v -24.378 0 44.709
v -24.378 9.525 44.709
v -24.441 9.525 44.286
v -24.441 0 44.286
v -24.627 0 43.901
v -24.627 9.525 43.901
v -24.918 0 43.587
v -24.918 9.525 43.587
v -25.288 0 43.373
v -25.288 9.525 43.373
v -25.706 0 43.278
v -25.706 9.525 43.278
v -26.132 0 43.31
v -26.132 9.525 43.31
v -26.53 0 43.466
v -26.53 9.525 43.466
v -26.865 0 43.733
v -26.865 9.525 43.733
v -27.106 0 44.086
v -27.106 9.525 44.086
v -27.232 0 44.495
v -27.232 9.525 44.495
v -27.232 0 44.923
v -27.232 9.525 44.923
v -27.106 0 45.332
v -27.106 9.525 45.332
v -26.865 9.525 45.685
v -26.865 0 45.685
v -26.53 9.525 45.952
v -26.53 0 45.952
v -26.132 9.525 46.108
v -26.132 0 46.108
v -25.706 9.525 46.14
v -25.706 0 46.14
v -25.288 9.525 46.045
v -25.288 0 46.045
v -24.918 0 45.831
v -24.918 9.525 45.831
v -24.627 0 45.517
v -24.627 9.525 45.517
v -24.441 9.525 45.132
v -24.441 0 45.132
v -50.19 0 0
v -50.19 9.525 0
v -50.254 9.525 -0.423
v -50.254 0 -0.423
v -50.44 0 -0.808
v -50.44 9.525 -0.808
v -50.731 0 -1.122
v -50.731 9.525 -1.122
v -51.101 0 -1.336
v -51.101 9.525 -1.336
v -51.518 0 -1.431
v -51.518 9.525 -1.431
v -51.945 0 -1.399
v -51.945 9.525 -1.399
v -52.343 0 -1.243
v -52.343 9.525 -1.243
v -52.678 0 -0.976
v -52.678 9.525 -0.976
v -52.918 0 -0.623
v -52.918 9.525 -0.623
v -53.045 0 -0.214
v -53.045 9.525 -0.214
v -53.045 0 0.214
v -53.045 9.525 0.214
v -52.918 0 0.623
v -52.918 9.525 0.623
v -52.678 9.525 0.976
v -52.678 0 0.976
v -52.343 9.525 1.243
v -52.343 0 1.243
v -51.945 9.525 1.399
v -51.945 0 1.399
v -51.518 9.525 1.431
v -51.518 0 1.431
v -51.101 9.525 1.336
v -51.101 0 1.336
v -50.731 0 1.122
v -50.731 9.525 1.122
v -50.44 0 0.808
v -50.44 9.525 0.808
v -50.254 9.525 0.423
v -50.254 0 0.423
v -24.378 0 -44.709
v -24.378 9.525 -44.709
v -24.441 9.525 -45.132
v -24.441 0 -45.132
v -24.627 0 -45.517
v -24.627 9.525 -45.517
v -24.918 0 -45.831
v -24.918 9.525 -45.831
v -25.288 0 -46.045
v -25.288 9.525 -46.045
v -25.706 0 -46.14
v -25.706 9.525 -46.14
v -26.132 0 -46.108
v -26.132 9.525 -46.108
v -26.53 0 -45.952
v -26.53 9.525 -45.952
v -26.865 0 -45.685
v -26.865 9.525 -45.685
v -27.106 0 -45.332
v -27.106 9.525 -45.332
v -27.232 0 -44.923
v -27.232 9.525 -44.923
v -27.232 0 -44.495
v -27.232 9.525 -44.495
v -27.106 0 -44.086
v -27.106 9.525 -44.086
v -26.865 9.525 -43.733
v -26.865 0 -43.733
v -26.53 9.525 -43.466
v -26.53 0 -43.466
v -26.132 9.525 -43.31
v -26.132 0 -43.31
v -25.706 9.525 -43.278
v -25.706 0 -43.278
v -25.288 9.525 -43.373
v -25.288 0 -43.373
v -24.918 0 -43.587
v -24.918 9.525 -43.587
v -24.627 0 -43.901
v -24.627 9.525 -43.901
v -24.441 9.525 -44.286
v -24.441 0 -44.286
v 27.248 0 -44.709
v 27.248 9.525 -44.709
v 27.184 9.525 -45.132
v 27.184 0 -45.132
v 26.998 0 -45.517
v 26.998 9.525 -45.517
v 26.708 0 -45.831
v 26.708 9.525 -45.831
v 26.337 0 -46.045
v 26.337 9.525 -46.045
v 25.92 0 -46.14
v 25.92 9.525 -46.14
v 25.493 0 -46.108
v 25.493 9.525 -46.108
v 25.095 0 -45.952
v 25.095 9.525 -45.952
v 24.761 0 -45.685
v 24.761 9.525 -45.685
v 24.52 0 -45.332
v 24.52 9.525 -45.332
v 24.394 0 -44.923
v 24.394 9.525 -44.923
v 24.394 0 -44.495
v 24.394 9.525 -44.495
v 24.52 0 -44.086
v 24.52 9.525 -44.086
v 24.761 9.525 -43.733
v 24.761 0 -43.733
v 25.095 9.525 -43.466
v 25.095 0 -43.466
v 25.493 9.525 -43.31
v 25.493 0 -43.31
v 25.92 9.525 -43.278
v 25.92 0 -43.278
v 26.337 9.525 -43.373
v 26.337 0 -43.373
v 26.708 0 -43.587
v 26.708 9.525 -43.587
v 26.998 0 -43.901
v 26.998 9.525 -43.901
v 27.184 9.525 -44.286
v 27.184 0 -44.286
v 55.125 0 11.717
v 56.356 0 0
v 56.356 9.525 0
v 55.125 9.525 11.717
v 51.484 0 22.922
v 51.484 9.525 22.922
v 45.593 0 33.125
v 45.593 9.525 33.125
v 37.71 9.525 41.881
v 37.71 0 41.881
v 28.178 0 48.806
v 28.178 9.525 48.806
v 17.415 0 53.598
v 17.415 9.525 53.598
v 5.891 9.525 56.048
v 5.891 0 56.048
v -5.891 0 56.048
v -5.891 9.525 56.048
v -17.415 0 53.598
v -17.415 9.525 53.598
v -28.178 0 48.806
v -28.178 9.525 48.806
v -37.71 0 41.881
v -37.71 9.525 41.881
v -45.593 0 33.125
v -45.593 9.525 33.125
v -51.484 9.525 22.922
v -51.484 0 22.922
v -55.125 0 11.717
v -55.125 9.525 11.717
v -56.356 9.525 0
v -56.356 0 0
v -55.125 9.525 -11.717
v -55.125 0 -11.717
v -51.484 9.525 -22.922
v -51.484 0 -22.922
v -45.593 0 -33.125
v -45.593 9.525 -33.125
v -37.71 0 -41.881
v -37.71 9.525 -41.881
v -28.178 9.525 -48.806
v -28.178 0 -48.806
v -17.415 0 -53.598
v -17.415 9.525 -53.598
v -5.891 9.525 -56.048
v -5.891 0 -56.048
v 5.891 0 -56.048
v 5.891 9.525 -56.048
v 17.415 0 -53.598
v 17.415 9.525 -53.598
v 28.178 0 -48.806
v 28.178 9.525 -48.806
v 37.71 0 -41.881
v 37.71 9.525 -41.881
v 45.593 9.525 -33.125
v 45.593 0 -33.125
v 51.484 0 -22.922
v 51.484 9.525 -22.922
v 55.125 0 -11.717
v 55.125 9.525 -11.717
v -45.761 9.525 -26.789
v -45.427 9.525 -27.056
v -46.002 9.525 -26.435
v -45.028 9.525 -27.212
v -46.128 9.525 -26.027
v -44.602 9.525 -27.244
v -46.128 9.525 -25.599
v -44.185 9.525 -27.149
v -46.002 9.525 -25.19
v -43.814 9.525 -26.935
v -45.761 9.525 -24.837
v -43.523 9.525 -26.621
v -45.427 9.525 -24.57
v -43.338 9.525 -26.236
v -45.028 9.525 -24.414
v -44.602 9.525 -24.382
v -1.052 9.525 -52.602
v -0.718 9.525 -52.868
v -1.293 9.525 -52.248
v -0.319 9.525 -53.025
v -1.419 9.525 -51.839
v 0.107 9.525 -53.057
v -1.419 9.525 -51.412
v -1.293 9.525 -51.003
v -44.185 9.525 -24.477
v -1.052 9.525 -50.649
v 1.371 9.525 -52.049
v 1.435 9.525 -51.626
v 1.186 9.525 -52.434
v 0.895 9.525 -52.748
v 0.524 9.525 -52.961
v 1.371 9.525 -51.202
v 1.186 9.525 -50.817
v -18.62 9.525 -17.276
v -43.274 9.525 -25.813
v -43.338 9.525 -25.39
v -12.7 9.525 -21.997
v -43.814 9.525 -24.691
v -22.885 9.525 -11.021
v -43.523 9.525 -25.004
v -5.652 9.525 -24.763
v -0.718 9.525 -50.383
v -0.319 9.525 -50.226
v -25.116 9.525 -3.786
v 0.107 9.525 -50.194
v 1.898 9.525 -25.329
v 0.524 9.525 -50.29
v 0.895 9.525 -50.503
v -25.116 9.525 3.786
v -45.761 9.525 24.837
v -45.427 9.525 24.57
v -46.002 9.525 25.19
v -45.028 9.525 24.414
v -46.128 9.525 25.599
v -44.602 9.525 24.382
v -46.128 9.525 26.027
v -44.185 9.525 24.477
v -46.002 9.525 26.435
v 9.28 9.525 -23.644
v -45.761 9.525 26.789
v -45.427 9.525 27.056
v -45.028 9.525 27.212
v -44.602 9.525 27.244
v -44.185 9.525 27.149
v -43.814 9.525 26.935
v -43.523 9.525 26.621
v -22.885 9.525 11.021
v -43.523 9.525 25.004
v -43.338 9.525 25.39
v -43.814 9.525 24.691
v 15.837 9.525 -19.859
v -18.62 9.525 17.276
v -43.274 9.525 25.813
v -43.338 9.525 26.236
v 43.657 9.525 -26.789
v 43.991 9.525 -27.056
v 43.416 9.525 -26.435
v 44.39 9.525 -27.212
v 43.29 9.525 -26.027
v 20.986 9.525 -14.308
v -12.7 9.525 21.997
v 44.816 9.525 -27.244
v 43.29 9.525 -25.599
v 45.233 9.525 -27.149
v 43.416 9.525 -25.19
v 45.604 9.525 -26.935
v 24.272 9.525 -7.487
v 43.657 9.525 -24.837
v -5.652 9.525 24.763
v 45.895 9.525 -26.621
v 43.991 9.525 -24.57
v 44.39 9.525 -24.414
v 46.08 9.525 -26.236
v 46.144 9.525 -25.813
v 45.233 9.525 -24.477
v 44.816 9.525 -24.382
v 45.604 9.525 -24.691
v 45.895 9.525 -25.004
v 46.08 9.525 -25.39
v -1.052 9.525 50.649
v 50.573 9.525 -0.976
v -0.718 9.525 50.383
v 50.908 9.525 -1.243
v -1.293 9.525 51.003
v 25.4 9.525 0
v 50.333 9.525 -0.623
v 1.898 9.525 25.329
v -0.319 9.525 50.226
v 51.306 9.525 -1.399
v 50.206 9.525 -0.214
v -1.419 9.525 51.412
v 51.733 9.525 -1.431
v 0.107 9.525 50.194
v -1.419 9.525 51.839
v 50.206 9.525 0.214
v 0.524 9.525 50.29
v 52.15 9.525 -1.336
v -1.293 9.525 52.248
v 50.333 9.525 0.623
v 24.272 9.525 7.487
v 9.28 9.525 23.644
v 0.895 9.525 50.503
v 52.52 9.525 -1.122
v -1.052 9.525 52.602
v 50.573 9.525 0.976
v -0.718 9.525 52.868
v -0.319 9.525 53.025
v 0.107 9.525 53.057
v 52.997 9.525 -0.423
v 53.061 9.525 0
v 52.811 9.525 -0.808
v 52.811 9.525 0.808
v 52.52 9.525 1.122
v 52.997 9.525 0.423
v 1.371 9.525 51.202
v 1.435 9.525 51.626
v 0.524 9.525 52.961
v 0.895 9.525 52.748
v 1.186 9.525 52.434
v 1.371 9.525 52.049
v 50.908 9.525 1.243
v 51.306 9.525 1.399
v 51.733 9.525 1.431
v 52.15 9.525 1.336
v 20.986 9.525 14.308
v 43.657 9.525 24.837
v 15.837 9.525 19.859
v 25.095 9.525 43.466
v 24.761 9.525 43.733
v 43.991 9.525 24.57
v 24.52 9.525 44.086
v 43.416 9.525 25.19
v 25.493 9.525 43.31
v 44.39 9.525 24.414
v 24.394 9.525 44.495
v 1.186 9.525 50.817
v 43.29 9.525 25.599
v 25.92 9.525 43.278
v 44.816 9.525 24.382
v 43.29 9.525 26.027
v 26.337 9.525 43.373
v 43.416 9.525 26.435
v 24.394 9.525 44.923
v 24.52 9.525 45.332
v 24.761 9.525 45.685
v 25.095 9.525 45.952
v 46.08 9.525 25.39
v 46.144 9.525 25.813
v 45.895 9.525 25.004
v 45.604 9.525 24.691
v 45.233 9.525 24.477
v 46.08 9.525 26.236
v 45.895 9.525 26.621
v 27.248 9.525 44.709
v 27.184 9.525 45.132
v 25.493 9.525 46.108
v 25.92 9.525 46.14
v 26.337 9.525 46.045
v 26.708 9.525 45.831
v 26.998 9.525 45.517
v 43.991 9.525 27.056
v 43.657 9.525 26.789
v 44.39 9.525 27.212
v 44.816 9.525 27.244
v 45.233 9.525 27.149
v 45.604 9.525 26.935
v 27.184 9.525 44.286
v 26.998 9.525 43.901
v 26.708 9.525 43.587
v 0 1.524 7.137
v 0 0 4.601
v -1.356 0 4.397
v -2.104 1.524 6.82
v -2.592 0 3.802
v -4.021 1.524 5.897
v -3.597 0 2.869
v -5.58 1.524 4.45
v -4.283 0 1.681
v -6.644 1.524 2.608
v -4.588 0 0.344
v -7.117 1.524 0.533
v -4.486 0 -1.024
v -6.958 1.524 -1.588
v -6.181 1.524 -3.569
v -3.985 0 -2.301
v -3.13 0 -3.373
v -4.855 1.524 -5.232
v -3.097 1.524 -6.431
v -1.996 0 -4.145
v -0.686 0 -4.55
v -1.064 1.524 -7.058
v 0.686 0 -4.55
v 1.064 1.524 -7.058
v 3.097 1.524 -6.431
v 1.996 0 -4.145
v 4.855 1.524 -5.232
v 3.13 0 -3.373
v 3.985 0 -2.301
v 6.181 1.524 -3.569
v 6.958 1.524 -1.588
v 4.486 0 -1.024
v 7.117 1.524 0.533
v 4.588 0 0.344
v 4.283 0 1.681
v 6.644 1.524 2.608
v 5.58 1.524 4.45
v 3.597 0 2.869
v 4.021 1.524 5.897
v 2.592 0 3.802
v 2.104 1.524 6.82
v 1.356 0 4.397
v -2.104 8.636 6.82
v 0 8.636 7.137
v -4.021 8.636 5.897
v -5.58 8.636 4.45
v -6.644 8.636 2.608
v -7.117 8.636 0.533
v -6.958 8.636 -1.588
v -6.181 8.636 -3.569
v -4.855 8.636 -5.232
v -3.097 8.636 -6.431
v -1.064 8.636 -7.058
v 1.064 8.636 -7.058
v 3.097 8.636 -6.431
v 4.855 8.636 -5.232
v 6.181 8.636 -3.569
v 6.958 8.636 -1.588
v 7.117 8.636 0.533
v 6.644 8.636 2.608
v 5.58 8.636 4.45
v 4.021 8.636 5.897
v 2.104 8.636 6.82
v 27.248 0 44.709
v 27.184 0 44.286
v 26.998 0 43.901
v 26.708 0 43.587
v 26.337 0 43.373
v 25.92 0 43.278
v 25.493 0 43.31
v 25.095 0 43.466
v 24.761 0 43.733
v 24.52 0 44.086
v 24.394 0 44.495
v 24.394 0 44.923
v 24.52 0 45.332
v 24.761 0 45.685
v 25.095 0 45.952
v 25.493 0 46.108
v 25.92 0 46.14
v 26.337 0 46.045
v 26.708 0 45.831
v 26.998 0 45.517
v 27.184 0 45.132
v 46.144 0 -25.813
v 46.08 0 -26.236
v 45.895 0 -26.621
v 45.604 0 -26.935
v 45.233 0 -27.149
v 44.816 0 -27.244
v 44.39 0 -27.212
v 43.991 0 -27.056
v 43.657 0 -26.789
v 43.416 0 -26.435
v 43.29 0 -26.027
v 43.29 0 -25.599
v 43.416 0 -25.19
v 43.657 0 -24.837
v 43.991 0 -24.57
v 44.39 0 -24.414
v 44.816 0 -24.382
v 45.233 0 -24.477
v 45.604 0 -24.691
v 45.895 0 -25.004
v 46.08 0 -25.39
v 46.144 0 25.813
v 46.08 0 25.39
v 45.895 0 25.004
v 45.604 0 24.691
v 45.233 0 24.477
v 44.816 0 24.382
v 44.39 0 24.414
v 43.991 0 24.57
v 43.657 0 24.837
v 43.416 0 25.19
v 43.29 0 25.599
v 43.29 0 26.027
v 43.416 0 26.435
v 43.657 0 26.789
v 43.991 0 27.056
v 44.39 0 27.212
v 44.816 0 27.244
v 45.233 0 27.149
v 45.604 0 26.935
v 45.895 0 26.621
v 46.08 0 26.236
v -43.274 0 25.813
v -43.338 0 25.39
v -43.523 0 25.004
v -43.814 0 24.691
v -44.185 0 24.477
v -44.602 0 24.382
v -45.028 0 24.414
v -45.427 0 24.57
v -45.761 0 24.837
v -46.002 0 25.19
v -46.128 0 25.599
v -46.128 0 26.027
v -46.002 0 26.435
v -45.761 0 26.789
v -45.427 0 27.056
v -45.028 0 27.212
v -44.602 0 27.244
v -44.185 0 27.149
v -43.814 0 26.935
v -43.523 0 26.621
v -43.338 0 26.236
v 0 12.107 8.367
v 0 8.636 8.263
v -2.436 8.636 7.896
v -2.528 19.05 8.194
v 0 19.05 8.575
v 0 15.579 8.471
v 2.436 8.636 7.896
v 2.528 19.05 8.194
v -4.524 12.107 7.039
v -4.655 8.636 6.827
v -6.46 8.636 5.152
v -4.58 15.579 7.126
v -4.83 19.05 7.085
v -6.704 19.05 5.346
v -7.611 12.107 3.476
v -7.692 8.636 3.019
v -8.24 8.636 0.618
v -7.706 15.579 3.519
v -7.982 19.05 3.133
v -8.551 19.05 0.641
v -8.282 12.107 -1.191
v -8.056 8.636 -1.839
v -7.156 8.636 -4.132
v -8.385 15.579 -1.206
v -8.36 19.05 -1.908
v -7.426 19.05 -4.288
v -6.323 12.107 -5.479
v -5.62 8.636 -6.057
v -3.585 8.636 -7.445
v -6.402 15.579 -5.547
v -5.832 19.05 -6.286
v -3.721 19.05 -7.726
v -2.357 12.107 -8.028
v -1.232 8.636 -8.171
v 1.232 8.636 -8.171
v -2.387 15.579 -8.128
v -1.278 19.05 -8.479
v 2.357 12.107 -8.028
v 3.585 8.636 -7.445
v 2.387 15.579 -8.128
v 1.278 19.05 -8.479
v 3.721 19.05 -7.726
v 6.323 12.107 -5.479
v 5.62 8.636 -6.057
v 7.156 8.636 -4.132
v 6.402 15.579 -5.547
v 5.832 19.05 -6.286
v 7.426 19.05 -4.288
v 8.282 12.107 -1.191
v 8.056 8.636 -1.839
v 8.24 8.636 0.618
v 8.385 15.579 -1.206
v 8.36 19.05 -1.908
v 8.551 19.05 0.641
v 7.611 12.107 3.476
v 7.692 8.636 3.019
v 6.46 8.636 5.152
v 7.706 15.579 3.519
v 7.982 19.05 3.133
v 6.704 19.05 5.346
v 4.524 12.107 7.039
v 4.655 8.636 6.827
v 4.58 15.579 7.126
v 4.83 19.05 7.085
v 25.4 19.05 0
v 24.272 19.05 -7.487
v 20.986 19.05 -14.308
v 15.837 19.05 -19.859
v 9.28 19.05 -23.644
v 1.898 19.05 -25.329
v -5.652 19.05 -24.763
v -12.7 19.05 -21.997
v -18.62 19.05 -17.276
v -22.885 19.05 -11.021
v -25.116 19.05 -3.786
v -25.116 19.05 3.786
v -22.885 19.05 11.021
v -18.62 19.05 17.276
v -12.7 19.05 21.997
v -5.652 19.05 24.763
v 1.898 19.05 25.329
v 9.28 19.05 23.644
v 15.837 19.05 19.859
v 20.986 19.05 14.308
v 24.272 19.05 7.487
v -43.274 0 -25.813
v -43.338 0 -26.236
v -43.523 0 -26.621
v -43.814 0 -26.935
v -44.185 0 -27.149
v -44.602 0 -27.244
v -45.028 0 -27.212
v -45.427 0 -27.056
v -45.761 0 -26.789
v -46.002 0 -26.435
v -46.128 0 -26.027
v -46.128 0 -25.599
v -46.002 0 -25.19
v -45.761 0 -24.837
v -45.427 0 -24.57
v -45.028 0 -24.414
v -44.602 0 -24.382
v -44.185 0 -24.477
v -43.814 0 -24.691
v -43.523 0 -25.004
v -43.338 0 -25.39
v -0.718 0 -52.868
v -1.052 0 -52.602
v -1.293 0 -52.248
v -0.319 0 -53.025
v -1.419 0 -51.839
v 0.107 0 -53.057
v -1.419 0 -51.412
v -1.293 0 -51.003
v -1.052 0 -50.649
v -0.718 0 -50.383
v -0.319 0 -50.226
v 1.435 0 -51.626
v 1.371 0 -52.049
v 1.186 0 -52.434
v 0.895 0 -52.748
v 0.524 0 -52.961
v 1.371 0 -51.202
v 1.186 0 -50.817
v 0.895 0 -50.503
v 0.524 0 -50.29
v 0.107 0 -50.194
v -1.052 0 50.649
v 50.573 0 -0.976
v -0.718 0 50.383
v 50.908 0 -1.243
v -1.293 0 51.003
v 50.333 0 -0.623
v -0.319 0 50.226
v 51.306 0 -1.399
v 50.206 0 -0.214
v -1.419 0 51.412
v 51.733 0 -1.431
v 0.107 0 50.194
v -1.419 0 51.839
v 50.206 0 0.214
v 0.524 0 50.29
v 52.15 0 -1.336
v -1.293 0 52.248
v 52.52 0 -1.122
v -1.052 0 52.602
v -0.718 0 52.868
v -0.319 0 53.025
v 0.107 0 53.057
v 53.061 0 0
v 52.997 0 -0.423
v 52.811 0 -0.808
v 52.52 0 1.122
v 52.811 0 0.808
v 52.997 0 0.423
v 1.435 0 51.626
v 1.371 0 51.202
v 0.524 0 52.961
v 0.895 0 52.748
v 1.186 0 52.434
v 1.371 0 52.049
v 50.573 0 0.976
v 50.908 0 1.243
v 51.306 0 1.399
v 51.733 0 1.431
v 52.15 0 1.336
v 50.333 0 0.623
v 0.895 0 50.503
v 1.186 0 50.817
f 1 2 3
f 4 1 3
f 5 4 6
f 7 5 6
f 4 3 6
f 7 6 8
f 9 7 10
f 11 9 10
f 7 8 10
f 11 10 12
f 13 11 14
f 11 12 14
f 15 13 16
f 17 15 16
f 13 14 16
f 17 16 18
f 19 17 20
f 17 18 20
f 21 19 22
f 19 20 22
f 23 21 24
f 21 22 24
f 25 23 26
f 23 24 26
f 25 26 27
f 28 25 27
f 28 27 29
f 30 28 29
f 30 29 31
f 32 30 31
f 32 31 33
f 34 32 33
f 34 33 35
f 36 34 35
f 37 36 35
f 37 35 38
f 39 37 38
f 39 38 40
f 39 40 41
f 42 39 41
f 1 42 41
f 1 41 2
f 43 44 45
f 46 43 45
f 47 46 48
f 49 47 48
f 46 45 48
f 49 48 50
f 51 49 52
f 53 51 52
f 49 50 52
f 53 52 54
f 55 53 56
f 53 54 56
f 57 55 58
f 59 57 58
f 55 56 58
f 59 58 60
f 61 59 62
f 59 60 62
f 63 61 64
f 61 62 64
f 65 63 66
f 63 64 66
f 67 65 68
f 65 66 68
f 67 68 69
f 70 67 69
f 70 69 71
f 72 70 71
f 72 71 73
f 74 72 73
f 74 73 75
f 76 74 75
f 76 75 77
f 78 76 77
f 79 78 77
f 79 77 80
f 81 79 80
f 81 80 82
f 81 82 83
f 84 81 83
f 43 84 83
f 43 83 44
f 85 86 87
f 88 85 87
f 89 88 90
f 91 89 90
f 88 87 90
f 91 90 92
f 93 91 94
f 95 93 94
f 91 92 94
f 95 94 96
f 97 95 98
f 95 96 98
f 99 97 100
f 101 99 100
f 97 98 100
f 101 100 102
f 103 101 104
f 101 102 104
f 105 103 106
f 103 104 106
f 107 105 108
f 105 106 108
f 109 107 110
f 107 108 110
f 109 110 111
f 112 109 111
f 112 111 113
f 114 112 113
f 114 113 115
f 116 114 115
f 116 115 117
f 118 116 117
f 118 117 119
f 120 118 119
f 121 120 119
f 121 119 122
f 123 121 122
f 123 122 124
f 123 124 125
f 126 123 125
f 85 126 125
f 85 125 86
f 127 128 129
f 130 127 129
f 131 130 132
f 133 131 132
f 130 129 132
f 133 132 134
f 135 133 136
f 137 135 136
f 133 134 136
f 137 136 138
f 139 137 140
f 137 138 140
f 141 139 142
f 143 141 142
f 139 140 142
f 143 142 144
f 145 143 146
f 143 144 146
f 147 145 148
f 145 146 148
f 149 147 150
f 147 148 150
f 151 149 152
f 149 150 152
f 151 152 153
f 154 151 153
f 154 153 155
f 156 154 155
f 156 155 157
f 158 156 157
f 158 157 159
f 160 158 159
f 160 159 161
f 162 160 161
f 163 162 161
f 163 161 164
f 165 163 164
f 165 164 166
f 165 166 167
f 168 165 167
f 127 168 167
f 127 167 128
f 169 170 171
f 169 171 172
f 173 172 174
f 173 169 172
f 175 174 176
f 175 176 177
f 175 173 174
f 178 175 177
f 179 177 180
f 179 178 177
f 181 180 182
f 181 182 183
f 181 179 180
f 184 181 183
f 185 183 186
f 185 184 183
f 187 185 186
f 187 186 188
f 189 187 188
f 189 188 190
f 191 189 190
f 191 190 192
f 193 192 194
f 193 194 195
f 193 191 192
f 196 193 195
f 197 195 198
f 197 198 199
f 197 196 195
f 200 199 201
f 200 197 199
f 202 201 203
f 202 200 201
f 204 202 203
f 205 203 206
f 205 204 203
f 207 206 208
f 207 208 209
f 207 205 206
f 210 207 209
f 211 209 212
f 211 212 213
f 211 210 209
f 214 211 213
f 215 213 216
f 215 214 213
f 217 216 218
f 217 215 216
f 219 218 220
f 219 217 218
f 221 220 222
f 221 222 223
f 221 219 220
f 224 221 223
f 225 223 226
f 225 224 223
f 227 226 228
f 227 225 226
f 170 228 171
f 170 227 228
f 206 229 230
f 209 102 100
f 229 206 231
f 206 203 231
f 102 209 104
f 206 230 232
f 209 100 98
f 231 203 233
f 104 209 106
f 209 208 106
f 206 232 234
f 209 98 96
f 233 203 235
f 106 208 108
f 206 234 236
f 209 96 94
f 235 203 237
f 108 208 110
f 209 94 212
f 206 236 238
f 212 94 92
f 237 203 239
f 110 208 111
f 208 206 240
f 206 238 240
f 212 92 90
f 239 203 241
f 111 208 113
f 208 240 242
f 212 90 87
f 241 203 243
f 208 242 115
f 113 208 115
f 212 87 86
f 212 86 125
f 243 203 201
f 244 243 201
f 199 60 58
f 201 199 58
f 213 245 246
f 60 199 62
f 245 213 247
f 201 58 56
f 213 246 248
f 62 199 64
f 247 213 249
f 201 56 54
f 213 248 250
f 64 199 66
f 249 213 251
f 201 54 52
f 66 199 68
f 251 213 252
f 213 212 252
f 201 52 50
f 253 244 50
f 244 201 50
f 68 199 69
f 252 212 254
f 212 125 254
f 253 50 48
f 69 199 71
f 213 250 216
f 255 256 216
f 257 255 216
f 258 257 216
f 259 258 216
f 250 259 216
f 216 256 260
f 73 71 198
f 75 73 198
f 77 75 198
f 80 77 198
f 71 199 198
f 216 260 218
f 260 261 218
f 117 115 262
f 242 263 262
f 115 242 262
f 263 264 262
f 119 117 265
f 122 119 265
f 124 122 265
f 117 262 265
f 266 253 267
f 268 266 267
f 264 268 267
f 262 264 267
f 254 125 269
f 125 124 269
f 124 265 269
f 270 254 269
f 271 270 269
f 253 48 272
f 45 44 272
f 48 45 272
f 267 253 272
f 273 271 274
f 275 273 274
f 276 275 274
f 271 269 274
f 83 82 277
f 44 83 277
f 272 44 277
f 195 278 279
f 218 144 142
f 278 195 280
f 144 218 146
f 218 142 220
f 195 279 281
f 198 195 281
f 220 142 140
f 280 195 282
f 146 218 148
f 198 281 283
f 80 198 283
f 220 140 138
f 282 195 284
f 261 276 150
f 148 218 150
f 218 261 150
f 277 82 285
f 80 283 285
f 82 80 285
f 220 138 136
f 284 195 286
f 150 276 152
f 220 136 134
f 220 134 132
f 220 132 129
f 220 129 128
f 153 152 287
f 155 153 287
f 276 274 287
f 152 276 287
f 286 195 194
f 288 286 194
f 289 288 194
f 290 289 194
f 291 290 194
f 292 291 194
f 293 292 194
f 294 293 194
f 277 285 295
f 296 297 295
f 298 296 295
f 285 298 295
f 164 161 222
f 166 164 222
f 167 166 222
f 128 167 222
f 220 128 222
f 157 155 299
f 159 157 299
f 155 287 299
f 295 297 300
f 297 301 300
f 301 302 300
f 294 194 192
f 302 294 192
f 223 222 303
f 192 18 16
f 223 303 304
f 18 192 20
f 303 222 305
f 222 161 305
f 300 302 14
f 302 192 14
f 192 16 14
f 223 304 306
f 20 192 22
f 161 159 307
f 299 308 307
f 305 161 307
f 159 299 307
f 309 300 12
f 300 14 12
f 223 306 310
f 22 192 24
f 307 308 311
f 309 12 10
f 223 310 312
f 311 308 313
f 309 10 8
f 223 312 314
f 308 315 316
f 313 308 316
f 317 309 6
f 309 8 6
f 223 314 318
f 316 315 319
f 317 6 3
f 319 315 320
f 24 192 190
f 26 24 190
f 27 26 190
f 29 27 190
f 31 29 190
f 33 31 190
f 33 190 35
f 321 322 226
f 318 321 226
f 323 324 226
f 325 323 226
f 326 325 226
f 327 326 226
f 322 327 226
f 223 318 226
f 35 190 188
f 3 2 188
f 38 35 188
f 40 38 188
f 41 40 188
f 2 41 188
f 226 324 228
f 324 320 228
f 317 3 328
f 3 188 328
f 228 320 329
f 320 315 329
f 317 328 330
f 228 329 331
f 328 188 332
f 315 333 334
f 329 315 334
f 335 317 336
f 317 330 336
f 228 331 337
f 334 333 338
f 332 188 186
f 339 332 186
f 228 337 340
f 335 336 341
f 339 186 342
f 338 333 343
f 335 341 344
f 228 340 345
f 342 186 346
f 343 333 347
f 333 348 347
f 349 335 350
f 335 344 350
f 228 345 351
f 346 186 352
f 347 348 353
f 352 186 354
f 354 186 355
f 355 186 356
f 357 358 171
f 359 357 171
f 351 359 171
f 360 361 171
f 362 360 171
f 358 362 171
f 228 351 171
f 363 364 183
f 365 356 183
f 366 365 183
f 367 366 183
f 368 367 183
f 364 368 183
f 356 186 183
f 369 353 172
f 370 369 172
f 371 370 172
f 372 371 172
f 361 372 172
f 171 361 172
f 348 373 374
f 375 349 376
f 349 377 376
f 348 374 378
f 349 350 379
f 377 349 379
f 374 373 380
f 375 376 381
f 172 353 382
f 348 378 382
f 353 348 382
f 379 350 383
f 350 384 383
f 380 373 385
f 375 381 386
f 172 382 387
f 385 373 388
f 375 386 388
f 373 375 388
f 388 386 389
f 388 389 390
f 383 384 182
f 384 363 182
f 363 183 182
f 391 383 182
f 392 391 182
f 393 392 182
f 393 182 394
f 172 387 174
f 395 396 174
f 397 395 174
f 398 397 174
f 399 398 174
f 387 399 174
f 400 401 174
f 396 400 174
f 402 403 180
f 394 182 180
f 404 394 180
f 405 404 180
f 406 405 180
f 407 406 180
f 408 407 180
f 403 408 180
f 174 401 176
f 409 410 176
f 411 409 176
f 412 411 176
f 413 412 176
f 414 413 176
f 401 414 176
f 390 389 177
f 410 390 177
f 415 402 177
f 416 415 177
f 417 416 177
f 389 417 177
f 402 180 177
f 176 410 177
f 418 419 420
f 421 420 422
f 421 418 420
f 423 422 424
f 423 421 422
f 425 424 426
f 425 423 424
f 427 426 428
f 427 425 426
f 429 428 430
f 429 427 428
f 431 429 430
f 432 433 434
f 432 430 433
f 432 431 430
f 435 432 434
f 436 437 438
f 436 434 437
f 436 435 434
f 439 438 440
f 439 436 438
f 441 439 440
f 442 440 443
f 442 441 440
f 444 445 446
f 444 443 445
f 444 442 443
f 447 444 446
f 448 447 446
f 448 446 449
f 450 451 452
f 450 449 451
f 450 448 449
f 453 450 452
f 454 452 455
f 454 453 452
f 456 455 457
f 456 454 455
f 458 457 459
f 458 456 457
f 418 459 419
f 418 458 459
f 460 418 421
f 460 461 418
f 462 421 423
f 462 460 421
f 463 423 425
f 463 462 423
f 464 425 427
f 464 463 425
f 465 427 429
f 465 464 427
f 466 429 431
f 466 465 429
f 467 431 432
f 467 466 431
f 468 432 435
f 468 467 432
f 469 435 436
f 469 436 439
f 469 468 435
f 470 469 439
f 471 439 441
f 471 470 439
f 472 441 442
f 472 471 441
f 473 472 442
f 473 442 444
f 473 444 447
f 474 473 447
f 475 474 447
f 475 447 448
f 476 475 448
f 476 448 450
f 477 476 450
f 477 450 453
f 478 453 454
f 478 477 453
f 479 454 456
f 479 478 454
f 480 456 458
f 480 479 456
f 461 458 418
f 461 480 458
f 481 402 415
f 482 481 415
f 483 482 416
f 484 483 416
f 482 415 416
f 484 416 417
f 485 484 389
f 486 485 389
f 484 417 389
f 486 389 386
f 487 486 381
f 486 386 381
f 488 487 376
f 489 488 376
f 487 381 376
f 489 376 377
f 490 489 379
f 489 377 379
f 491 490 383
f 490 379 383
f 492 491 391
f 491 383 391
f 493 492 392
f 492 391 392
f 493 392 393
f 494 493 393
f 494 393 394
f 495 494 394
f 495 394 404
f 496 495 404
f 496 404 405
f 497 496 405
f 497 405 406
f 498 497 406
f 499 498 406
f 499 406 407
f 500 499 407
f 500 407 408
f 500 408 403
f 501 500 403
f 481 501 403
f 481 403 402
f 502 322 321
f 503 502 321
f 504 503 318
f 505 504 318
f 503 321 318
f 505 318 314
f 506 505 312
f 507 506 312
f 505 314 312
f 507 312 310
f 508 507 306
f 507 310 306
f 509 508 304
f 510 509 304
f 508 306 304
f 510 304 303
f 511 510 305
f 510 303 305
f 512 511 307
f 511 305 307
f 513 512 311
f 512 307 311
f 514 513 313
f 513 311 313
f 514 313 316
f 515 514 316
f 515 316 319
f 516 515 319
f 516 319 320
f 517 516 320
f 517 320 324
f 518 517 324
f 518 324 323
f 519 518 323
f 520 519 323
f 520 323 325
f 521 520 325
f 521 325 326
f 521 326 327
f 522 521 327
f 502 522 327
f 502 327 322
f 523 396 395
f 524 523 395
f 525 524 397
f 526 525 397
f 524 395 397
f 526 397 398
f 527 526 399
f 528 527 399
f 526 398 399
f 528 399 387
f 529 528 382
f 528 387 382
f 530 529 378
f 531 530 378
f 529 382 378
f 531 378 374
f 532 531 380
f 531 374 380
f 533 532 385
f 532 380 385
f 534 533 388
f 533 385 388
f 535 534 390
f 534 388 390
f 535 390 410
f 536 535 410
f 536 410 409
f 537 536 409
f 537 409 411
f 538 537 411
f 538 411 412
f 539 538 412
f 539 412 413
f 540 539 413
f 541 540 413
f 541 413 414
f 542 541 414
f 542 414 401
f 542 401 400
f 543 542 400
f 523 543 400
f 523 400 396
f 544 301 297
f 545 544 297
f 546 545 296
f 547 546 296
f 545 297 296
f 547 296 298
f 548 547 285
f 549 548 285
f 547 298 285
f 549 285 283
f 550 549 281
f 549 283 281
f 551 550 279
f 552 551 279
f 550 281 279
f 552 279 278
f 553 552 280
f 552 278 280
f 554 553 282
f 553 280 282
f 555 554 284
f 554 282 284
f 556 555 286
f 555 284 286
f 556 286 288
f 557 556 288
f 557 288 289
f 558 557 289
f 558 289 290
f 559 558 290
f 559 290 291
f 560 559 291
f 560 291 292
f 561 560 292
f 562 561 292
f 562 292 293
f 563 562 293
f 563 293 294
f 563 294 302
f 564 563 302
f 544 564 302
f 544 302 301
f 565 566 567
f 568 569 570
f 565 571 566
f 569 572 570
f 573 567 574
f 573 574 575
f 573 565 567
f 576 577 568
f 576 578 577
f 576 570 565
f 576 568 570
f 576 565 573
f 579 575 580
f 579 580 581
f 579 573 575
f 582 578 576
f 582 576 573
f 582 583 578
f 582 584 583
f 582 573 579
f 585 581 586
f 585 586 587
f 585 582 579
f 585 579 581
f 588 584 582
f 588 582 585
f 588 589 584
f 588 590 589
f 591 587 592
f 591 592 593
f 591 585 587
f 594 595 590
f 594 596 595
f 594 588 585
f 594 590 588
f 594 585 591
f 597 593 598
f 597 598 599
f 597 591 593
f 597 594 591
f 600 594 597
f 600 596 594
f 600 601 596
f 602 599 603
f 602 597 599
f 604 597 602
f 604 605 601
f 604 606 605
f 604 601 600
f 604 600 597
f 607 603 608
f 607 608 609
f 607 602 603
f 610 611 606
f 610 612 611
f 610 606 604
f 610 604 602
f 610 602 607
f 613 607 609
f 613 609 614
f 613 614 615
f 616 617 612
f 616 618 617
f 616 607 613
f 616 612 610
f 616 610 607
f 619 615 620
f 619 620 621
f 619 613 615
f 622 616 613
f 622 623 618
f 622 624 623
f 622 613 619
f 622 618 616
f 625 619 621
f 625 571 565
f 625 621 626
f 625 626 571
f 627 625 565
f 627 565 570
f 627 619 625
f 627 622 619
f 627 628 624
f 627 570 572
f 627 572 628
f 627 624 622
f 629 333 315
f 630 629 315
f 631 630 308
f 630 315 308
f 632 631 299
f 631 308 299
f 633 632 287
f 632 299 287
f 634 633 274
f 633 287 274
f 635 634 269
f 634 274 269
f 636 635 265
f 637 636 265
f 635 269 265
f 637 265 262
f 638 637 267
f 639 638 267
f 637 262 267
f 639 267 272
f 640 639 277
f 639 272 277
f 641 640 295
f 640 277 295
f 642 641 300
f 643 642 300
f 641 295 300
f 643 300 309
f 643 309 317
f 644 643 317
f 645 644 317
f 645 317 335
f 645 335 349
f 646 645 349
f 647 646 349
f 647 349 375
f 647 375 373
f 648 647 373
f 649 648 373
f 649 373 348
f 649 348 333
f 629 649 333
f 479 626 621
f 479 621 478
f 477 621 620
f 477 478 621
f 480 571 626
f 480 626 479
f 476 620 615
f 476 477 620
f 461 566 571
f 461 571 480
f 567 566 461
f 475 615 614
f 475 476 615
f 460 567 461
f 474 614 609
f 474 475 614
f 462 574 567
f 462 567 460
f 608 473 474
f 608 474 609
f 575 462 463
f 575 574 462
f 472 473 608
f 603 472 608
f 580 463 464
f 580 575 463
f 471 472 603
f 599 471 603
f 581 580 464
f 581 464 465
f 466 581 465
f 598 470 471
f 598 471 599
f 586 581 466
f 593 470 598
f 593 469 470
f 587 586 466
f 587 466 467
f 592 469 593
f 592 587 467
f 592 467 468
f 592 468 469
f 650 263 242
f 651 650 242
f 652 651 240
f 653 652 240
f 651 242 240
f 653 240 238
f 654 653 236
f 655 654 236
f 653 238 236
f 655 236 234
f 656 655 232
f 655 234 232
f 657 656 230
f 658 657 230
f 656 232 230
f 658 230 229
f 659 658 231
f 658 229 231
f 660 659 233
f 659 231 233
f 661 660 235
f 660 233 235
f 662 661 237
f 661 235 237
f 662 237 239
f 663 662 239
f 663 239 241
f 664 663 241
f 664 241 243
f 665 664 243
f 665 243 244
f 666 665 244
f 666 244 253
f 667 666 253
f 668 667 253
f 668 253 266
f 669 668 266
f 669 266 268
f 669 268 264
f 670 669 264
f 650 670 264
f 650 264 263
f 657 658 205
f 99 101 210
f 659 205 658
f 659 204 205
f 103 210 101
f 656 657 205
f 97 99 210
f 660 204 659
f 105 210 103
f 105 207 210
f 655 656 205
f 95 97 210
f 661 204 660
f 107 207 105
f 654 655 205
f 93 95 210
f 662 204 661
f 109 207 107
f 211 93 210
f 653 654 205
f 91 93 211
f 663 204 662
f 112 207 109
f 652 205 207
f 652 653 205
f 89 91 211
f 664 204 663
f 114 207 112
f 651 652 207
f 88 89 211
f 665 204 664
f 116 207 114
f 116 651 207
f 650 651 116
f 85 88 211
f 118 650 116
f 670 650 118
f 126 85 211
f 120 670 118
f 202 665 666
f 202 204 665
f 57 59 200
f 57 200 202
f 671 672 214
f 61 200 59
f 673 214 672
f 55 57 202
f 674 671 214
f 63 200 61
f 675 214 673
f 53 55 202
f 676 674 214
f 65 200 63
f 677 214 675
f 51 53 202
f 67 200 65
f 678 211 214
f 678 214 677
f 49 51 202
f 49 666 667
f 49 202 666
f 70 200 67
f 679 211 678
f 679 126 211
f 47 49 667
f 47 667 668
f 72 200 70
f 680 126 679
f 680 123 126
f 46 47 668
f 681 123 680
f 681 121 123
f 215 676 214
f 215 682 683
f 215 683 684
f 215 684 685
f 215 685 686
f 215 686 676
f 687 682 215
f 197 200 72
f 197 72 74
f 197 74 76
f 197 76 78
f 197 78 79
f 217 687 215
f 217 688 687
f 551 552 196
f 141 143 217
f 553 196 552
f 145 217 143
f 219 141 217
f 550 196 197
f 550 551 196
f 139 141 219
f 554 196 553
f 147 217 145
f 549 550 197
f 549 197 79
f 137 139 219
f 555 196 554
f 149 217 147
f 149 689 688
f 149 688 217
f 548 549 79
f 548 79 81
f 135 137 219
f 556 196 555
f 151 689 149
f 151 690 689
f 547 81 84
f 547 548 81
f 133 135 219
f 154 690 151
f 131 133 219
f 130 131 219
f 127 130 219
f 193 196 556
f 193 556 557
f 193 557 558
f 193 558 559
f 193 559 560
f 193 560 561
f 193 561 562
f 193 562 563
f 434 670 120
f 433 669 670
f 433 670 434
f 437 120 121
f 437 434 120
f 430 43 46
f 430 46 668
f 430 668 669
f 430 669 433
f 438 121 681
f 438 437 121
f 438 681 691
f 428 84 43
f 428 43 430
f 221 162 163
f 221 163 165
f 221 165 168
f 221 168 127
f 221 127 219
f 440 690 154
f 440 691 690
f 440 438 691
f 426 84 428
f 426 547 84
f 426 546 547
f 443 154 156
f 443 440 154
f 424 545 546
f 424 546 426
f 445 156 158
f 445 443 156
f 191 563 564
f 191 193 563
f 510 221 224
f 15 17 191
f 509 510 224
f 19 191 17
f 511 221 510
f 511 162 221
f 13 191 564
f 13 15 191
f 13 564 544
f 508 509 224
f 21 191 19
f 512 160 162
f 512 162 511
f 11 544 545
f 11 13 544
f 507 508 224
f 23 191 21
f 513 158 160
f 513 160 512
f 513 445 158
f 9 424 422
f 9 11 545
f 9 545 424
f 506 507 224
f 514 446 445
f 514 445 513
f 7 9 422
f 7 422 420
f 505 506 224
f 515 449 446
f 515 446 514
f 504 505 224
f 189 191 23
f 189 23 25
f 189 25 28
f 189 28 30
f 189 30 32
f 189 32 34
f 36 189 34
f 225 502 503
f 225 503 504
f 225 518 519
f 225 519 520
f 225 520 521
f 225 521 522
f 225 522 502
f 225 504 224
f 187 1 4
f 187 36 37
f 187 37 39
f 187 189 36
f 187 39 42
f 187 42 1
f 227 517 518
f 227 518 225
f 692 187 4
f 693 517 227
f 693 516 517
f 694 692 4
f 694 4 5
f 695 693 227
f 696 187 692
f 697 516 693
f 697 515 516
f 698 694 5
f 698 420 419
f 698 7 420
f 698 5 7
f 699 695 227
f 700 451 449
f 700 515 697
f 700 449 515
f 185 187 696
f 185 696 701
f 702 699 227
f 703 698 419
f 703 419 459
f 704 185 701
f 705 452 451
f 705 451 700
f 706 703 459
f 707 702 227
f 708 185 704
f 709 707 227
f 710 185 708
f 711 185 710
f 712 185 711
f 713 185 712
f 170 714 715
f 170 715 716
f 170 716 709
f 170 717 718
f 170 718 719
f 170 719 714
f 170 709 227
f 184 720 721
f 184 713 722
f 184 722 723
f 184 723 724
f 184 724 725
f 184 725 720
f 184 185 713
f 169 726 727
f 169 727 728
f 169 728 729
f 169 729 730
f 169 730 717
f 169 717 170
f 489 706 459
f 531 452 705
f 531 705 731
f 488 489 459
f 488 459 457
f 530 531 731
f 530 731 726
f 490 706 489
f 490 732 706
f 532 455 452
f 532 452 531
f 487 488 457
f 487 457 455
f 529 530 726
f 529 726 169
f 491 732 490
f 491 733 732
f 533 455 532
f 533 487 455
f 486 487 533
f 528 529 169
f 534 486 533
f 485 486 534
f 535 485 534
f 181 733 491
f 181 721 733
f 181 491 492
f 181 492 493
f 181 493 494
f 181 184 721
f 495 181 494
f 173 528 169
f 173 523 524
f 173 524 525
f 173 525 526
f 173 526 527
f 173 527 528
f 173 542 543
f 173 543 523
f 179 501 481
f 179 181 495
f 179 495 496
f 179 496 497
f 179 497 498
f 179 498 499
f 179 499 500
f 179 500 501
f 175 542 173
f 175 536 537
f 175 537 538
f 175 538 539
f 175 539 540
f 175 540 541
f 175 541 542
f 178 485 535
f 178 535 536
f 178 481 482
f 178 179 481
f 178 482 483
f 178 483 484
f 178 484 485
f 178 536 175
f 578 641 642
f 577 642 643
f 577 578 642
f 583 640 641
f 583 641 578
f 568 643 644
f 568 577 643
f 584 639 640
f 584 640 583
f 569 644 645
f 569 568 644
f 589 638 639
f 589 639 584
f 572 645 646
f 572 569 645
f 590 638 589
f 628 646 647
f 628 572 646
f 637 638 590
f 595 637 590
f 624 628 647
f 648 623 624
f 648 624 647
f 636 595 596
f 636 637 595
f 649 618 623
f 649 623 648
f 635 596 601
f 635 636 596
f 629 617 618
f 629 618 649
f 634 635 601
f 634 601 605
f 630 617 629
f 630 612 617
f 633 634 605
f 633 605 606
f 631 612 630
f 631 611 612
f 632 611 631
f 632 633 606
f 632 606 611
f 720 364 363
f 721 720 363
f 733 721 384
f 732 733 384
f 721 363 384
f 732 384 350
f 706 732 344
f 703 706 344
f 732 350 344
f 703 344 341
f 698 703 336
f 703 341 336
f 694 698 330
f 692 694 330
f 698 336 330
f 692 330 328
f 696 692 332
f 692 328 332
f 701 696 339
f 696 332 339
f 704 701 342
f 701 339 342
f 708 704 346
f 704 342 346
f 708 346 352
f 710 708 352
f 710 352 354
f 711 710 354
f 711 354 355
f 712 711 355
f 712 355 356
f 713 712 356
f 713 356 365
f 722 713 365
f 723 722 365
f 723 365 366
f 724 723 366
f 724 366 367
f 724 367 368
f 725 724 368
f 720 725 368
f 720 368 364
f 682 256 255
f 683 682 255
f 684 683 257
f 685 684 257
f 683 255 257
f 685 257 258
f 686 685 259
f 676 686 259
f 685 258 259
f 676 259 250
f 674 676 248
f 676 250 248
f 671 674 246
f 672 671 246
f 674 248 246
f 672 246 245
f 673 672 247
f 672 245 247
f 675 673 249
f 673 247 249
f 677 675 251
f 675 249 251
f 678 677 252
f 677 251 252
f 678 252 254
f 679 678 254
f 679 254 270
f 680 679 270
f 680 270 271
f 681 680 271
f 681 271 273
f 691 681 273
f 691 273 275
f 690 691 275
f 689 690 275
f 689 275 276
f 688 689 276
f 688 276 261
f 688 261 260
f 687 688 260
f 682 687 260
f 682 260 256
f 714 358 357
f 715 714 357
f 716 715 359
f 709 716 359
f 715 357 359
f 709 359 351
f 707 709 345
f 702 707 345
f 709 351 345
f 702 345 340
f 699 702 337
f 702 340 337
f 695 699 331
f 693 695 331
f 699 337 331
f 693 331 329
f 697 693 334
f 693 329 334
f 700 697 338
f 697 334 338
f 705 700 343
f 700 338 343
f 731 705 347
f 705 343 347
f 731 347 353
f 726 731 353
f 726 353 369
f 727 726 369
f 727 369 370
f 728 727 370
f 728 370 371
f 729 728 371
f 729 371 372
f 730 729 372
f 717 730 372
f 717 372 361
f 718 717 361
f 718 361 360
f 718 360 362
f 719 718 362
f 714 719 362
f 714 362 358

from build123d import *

# Parameters (mm, degrees)
SKETCH2_R           = 25.4
BASE_CYLINDER_DEPTH = 19.05
SKETCH3_R           = 56.35625
AFT_FLANGE_DEPTH    = 9.525
BOLT_CIRCLE_D       = 2.8702
BOLT_CIRCLE_DEPTH   = 9.525


with BuildPart() as part:
    # Sketch2 → Base Cylinder (new body)
    with BuildSketch(Plane(origin=(0, 0, 0), x_dir=(1, 0, 0), z_dir=(0, 1, 0))):
        Circle(SKETCH2_R)
    extrude(amount=BASE_CYLINDER_DEPTH)

    # Sketch3 → Aft Flange (add)
    with BuildSketch(Plane.XZ):
        Circle(SKETCH3_R)
    extrude(amount=-AFT_FLANGE_DEPTH)

    # Bolt Circle
    with Locations(Plane(origin=(0, 0, 0), x_dir=(-1, 0, 0), z_dir=(0, -1, 0))):
        with Locations((-25.81275, -44.708994483), (-44.708994483, -25.81275), (-51.6255, 0), (-44.708994483, 25.81275), (-25.81275, 44.708994483), (0, 51.6255), (25.81275, 44.708994483), (44.708994483, 25.81275), (51.6255, 0), (44.708994483, -25.81275), (25.81275, -44.708994483), (0, -51.6255)):
            Hole(BOLT_CIRCLE_D / 2, depth=BOLT_CIRCLE_DEPTH)

    # Sketch17 → 3/8 NPT Tapped Hole1 (revolve, cut)
    with BuildSketch(Plane(origin=(0, 19.05, 0), x_dir=(0, 0, 1), z_dir=(1, 0, 0))):
        Polygon((0, 0), (0, 21.814582582), (7.1374, 17.526), (7.1374, 10.414), (8.263205494, 10.414), (8.5750146, 0), align=None)
    revolve(axis=Axis((0, 25.4, 0), (0, -1, 0)), mode=Mode.SUBTRACT)


solid = part.part
